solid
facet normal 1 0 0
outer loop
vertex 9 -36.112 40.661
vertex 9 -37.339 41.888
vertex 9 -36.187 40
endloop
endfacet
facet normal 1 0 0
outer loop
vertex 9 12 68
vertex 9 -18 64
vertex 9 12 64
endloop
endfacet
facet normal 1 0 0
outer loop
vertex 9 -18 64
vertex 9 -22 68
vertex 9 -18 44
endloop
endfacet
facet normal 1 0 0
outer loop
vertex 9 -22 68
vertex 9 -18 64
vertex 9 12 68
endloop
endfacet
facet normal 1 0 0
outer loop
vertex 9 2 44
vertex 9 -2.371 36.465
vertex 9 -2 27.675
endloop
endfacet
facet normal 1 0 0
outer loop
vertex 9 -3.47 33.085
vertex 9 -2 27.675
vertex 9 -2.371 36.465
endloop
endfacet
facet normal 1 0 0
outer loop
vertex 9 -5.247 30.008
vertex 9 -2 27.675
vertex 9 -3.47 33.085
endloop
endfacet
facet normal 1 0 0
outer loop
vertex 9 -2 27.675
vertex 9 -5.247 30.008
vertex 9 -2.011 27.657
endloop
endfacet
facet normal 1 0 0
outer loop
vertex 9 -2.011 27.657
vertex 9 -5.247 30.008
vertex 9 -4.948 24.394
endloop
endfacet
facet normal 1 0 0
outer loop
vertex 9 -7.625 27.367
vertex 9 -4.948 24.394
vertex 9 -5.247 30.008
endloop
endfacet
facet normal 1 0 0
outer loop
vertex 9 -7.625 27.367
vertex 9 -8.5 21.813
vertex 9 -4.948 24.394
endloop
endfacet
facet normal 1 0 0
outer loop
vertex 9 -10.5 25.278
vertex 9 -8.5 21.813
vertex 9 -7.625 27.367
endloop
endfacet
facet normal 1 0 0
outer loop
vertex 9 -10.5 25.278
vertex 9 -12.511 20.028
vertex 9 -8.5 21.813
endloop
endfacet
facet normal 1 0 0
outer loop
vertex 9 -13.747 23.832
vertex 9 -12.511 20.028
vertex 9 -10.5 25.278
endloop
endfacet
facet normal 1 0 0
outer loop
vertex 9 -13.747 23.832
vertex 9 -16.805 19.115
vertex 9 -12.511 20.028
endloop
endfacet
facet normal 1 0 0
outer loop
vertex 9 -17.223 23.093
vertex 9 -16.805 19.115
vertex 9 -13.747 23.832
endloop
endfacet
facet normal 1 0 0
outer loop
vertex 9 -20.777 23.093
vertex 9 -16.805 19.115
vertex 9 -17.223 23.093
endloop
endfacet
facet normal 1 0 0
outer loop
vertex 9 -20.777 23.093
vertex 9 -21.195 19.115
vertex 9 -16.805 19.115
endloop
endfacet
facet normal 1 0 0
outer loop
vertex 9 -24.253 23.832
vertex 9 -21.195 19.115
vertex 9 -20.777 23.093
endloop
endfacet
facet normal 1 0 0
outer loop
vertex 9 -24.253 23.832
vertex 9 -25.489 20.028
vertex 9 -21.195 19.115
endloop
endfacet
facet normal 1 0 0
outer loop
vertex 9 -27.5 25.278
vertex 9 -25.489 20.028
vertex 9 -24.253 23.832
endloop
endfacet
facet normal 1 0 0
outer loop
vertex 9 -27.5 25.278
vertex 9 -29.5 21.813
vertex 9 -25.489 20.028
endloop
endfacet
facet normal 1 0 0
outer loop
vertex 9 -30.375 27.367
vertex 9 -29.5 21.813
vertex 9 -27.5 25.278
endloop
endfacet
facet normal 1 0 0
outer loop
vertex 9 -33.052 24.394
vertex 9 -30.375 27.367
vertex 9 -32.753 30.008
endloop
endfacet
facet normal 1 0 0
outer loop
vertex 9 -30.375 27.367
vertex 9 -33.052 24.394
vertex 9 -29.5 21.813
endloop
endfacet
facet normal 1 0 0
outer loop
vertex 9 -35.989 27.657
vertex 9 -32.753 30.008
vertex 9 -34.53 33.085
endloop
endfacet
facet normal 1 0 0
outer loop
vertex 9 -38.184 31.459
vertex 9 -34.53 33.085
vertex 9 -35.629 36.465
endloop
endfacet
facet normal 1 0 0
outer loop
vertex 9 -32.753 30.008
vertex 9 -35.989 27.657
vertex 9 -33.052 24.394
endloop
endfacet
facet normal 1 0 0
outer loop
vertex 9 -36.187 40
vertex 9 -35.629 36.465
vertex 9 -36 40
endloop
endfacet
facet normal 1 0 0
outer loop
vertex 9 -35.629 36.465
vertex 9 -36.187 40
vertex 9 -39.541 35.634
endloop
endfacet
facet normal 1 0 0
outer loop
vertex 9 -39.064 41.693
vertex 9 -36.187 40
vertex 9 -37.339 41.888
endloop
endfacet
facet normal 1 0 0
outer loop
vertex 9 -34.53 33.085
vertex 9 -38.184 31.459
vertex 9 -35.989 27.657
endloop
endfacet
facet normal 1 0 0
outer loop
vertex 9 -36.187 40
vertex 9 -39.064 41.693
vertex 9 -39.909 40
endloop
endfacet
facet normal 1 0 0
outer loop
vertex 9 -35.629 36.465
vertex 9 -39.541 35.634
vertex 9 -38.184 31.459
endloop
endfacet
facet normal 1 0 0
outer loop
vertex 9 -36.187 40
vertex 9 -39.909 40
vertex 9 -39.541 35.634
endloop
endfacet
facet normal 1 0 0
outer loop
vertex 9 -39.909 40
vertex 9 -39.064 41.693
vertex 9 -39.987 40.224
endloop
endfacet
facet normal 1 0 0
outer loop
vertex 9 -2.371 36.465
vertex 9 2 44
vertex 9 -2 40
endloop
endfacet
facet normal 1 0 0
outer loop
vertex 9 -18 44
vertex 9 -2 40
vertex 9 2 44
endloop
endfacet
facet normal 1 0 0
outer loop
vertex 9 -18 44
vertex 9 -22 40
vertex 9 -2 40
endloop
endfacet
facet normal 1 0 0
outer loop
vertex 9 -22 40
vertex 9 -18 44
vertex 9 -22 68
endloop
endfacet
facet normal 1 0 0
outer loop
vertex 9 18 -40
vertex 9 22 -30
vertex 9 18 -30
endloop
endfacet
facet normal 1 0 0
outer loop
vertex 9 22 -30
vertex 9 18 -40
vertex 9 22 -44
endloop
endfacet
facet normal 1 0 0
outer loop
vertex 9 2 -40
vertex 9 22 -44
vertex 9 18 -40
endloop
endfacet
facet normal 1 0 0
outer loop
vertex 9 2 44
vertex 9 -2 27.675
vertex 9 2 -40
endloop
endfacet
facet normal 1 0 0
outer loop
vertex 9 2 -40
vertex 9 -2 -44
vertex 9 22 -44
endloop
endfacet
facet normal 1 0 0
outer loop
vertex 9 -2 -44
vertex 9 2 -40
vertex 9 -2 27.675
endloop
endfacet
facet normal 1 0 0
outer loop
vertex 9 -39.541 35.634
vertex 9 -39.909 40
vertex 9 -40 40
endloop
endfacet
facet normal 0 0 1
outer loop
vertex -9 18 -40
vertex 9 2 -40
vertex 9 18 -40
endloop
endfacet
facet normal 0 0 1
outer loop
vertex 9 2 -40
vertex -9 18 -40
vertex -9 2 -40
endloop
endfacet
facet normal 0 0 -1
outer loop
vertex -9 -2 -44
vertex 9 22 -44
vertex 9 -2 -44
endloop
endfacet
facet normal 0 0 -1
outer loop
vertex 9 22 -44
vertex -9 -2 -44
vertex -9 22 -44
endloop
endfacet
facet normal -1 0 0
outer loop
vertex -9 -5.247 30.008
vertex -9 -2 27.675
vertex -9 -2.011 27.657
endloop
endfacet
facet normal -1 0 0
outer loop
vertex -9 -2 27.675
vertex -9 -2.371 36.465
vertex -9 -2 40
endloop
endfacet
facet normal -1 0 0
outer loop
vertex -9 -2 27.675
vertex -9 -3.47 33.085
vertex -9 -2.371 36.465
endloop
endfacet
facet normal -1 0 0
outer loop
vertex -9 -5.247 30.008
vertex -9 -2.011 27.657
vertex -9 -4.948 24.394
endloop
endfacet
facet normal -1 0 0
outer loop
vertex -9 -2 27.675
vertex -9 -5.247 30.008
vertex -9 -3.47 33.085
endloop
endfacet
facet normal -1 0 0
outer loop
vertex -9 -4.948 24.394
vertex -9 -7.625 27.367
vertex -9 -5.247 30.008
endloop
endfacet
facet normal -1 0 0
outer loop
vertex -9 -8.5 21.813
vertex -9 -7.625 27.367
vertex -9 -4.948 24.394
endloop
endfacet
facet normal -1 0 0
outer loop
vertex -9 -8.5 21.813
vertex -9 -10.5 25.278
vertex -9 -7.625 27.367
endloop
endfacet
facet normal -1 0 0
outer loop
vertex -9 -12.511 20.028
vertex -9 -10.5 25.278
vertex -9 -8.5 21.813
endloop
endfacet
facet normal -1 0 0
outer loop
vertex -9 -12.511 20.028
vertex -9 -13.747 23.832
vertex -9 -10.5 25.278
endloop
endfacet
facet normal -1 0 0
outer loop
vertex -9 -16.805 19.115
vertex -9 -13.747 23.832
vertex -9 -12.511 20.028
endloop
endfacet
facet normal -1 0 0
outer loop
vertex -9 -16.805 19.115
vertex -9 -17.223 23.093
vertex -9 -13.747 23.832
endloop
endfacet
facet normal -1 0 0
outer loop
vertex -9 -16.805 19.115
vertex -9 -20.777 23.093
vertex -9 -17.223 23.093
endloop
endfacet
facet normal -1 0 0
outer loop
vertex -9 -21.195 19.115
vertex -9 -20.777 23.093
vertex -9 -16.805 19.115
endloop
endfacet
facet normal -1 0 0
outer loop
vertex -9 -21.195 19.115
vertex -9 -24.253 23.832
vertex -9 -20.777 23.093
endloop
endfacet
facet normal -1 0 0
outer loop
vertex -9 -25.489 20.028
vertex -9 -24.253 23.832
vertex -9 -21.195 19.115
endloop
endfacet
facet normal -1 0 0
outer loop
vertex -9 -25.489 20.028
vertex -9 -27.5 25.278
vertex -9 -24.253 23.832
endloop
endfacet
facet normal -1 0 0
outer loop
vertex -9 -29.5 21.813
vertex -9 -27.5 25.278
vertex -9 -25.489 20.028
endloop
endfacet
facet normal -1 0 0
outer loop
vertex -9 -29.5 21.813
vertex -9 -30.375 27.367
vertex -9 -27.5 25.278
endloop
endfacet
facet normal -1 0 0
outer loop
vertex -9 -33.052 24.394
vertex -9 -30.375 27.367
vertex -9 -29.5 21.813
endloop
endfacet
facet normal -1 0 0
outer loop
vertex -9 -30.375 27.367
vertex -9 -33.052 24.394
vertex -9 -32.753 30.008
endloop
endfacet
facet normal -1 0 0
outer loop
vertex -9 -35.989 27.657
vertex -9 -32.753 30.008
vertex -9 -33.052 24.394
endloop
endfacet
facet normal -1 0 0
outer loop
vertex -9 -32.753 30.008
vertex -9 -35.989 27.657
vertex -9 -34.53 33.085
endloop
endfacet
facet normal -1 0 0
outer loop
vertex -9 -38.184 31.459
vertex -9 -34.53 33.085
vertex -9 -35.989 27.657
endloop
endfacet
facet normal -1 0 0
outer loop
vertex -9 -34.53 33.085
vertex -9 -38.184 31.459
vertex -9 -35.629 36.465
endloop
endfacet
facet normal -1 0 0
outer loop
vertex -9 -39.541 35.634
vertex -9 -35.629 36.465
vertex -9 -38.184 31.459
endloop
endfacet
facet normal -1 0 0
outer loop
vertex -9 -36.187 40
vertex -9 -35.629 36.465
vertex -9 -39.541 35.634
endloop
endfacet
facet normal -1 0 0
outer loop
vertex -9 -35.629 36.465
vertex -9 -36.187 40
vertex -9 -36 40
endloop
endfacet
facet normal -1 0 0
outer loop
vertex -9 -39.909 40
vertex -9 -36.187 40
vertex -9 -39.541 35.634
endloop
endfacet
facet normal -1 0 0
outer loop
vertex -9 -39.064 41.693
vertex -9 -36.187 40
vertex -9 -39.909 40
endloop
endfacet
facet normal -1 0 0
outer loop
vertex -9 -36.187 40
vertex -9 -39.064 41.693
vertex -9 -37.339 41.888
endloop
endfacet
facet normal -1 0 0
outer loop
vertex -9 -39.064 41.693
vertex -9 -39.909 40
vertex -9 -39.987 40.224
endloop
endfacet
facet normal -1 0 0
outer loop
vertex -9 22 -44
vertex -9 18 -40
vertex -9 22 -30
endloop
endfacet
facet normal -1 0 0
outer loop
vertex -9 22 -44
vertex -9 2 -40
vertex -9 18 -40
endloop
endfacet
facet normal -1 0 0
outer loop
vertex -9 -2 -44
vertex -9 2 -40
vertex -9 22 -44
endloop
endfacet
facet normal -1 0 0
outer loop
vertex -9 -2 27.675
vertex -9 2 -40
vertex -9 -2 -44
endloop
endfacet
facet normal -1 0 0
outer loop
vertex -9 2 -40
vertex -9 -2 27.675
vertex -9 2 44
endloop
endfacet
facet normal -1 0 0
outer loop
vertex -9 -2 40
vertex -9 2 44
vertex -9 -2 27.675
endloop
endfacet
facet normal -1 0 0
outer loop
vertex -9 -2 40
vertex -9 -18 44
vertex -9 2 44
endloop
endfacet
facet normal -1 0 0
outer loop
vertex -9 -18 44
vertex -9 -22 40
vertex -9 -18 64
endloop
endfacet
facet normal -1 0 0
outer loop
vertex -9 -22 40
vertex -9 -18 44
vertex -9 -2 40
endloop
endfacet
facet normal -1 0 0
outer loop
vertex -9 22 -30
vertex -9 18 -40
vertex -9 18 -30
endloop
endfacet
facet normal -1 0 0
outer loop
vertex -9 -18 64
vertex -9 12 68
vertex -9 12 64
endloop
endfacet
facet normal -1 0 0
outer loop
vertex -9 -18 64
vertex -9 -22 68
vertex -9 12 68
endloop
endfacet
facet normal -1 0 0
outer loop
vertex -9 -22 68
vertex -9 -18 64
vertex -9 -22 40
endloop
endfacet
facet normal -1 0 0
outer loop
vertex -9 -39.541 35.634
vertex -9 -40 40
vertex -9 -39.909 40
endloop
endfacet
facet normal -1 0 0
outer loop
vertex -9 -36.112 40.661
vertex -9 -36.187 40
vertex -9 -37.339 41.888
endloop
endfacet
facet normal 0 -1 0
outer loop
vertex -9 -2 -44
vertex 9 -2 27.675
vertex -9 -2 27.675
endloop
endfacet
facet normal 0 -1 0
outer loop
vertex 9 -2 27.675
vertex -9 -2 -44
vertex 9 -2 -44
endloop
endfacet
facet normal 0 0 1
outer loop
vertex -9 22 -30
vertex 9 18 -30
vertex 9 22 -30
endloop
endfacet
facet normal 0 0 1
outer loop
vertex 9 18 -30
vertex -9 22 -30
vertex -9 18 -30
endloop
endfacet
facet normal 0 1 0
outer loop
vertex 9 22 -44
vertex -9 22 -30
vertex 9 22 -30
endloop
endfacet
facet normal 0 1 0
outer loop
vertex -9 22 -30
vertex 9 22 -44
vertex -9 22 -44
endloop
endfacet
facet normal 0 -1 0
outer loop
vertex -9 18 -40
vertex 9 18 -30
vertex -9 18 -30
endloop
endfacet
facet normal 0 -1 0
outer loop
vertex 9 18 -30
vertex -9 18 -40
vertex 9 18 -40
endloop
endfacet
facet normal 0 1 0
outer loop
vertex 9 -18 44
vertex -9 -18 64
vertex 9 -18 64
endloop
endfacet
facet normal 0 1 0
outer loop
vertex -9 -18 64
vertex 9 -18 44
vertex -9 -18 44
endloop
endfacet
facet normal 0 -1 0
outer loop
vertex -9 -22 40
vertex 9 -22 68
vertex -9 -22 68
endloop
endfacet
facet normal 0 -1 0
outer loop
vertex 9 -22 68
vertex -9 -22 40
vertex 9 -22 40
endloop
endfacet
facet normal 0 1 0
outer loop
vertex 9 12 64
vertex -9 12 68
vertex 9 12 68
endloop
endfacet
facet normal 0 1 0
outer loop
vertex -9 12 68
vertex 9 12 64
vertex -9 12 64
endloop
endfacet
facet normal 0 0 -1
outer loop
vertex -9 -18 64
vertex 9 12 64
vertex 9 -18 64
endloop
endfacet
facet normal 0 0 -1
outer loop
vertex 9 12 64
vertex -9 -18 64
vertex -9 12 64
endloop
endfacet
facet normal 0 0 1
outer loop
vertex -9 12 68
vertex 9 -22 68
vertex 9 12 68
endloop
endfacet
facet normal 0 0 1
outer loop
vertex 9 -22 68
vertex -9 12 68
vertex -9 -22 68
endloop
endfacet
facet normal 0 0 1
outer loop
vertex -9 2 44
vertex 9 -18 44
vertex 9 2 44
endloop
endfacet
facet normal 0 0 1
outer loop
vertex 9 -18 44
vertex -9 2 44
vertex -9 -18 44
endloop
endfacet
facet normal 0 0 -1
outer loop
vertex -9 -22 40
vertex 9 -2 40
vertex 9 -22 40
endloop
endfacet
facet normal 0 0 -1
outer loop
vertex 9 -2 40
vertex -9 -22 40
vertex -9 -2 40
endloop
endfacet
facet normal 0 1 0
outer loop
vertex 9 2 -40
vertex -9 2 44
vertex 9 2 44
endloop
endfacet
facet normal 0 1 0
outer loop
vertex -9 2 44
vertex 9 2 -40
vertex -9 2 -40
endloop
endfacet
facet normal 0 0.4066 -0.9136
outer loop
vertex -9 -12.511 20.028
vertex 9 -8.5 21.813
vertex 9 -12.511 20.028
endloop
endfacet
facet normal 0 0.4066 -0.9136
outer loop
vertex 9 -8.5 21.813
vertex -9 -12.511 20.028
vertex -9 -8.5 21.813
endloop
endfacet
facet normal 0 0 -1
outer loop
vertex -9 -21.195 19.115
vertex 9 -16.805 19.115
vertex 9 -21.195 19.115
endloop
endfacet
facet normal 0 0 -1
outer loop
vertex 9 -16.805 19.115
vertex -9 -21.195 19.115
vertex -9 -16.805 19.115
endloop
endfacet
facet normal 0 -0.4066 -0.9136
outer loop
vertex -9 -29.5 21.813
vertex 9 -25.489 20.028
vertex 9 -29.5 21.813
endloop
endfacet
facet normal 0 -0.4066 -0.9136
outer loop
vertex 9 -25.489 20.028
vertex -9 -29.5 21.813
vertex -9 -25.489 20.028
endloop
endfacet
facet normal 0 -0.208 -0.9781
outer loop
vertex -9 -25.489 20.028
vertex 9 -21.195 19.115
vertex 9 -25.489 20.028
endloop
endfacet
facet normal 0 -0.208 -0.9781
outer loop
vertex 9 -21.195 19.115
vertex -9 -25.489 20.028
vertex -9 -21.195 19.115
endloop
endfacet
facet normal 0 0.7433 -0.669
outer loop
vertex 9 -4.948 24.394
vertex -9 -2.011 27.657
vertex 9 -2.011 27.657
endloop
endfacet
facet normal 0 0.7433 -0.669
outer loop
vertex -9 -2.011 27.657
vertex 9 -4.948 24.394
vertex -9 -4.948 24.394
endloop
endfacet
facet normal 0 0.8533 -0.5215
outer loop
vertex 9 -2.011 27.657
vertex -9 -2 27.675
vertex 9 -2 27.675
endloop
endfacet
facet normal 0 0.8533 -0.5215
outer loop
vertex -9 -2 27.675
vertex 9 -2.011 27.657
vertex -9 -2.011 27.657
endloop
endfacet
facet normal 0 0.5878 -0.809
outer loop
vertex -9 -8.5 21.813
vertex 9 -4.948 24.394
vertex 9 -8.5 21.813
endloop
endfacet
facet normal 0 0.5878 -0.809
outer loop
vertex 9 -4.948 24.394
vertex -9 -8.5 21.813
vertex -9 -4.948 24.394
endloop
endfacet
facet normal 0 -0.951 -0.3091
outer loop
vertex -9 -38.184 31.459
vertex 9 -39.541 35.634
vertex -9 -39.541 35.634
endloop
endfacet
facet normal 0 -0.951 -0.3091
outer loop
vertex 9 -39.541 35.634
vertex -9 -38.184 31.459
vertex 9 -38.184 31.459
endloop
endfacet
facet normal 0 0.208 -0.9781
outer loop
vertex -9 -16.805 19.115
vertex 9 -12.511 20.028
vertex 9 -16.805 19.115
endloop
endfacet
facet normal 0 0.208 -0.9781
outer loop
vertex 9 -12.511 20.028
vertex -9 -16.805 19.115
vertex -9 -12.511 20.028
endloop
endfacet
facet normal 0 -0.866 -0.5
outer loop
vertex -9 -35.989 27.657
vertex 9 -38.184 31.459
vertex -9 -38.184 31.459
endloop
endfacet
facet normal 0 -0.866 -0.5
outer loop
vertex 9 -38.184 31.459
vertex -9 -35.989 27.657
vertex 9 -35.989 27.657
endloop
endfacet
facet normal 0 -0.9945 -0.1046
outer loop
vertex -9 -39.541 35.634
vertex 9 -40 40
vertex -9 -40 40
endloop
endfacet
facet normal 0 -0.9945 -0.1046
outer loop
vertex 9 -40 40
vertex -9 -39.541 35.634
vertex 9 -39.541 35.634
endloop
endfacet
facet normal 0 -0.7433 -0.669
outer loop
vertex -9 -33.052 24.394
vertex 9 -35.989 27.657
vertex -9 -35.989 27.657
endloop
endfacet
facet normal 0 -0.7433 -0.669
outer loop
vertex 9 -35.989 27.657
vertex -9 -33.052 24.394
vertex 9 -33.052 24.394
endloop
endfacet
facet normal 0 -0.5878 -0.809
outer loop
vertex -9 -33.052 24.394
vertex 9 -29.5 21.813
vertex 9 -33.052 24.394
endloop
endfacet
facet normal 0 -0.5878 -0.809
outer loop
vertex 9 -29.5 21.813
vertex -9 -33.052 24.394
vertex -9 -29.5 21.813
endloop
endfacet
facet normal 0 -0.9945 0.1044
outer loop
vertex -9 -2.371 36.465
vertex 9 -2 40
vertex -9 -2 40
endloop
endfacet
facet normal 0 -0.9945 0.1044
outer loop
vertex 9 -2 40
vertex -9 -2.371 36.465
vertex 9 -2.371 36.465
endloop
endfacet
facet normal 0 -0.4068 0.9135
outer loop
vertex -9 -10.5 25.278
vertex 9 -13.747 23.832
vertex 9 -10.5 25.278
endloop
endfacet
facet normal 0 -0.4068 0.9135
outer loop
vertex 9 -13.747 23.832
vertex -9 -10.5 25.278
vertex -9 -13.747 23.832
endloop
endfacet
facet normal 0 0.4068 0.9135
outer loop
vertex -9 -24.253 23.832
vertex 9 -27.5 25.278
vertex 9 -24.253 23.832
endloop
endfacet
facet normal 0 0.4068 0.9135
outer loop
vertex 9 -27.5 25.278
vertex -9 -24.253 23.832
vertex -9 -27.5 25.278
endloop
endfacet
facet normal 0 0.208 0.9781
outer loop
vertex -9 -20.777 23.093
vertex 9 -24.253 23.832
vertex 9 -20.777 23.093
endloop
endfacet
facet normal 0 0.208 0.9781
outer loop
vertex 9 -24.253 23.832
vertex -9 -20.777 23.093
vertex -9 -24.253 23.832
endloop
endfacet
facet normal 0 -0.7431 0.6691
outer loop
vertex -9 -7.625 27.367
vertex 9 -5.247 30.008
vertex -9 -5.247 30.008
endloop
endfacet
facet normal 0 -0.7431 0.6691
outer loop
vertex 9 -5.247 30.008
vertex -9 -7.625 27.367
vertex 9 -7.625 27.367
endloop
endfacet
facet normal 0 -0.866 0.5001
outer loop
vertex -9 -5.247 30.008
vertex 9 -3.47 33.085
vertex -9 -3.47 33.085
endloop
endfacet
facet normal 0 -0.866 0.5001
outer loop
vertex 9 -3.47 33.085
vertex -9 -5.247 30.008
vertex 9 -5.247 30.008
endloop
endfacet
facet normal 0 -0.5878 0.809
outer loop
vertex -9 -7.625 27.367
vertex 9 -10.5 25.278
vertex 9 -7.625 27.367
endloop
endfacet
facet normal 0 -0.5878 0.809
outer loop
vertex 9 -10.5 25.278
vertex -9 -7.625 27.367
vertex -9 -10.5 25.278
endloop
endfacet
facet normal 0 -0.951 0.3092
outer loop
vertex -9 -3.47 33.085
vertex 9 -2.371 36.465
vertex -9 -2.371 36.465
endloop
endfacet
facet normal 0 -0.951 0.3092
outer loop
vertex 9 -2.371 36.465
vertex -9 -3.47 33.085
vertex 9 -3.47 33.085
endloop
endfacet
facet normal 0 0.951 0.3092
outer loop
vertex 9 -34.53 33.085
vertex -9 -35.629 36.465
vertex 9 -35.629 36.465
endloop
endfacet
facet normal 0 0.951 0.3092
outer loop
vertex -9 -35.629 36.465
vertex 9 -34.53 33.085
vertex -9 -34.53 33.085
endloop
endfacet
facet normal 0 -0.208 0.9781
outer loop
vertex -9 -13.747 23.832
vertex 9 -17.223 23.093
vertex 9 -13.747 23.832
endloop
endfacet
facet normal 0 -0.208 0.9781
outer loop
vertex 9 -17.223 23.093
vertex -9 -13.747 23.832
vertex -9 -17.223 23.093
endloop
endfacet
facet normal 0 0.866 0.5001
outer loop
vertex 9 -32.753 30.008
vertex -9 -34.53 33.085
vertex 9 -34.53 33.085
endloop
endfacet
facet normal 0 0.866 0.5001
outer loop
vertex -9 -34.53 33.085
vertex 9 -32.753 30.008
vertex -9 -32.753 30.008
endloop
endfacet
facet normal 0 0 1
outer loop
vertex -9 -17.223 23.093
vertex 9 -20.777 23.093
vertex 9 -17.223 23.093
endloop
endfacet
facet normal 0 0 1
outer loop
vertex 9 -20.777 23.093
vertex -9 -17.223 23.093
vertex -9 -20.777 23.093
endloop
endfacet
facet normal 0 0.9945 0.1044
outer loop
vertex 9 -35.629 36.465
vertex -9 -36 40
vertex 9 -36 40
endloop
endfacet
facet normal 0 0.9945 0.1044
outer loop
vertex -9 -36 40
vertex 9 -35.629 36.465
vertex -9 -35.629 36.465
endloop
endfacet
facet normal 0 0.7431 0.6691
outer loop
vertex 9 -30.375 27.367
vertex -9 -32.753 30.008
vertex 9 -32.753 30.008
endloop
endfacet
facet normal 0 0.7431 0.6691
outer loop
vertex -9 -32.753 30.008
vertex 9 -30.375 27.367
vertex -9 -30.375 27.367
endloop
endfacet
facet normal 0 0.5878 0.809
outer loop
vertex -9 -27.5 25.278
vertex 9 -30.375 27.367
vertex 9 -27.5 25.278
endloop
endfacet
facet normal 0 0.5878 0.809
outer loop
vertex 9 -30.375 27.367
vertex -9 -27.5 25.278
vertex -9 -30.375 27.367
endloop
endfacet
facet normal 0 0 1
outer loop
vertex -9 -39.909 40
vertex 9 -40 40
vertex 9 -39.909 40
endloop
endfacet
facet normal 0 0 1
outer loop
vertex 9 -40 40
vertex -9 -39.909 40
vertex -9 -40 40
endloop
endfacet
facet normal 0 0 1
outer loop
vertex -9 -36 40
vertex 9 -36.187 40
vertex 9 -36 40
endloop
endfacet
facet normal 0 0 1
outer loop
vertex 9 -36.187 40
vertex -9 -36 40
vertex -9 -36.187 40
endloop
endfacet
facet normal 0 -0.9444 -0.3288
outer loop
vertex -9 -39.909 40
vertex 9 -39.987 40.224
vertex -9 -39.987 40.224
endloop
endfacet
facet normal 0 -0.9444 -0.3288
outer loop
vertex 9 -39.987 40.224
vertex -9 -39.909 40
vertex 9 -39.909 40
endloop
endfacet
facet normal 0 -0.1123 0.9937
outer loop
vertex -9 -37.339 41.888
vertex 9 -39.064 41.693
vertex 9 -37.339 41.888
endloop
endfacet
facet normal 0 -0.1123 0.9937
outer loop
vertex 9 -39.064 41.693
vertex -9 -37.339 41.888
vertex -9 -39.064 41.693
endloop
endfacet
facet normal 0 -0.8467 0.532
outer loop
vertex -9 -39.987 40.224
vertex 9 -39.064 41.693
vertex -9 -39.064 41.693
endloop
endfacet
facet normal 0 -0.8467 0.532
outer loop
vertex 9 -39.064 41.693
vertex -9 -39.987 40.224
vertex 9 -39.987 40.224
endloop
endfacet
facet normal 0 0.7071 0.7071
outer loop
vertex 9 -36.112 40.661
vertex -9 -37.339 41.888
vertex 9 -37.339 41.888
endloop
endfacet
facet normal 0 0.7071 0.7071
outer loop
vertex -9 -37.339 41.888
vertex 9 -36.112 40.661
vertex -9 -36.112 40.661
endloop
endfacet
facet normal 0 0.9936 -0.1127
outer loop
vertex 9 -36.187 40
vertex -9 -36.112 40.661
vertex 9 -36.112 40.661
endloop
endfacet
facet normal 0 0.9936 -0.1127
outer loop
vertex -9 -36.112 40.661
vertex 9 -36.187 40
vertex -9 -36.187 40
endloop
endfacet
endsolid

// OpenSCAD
// Common
width  = 18;
depth  = 4;

// Table desk (top part)
desk_height = 22;
desk_depth = 16;
desk_part_height = 30;

// Table side (middle and bottom part)
side_height = 80;
side_depth  = 18;
back_height = 10;

// Hook
hook_radius = desk_depth+5;

module joiner(size=0, pos=depth) {
    color("gray") {
        translate([0,(size/2)-(pos/2),0]) {
            cube([width,depth,depth], center=true);
        }
    }
}

module main() {
    cube([width, depth, side_height], center=true);
}

module fillet(r, h) {
    translate([r / 2, r / 2, 0]) {
        difference() {
            cube([r + 0.01, r + 0.01, h], center = true);

            translate([r/2, r/2, 0]) {
                cylinder(r = r, h = h + 1, center = true);
            }
        }
    }
}

module bottom() {
    translate([0, side_depth/2+depth/2, (-side_height/2)-(depth/2)]) {
        joiner(-side_depth);
    
        rotate([90,0,0]) {
            cube([width, depth, side_depth], center=true);
        }
    
        translate([0, (side_depth/2), (back_height/2)]) {
            cube([width, depth, back_height+depth], center=true);
        }
    }
}

module top() {
    translate([0, -desk_depth/2-depth/2, (side_height/2)+depth/2]) {
        joiner(desk_depth, -depth);
    
        rotate([90,0,0]) {
            cube([width, depth, desk_depth], center=true);
        }
    
        joiner(-desk_depth);
    
        translate([0, -(desk_depth/2)-depth/2, (desk_height/2)+depth/2]) {
            cube([width, depth, desk_height], center=true);

            translate([0,desk_part_height/2,desk_height/2]) {
                rotate([90,0,0]) {
                    cube([width, depth, desk_part_height+depth], center=true);
                }
            }
        }
    }
}

module hook() {
    translate([-width/2 , -hook_radius+depth/2, side_height/2]) {
        union() {
            rotate([90,0,90]) {
                difference() {
                    cylinder(h=width, r=hook_radius);
                    cylinder(h=width, r=hook_radius-depth);
                    translate([-hook_radius,0,0]) {
                        cube([hook_radius*2, hook_radius, width]);
                    }
                }
            }
            
            translate([0 , -hook_radius+depth/2, 0]) {
                rotate([90,135,90]) {
                    cylinder(h=width, r=depth/2);
                }
            }
        }
    }
}

// Main body
color("red") {
    main();
}

// Bottom part
color("green") {
    bottom();
}

// Top part
color("blue") {
    top();
}

color("black") {
    hook();
}
